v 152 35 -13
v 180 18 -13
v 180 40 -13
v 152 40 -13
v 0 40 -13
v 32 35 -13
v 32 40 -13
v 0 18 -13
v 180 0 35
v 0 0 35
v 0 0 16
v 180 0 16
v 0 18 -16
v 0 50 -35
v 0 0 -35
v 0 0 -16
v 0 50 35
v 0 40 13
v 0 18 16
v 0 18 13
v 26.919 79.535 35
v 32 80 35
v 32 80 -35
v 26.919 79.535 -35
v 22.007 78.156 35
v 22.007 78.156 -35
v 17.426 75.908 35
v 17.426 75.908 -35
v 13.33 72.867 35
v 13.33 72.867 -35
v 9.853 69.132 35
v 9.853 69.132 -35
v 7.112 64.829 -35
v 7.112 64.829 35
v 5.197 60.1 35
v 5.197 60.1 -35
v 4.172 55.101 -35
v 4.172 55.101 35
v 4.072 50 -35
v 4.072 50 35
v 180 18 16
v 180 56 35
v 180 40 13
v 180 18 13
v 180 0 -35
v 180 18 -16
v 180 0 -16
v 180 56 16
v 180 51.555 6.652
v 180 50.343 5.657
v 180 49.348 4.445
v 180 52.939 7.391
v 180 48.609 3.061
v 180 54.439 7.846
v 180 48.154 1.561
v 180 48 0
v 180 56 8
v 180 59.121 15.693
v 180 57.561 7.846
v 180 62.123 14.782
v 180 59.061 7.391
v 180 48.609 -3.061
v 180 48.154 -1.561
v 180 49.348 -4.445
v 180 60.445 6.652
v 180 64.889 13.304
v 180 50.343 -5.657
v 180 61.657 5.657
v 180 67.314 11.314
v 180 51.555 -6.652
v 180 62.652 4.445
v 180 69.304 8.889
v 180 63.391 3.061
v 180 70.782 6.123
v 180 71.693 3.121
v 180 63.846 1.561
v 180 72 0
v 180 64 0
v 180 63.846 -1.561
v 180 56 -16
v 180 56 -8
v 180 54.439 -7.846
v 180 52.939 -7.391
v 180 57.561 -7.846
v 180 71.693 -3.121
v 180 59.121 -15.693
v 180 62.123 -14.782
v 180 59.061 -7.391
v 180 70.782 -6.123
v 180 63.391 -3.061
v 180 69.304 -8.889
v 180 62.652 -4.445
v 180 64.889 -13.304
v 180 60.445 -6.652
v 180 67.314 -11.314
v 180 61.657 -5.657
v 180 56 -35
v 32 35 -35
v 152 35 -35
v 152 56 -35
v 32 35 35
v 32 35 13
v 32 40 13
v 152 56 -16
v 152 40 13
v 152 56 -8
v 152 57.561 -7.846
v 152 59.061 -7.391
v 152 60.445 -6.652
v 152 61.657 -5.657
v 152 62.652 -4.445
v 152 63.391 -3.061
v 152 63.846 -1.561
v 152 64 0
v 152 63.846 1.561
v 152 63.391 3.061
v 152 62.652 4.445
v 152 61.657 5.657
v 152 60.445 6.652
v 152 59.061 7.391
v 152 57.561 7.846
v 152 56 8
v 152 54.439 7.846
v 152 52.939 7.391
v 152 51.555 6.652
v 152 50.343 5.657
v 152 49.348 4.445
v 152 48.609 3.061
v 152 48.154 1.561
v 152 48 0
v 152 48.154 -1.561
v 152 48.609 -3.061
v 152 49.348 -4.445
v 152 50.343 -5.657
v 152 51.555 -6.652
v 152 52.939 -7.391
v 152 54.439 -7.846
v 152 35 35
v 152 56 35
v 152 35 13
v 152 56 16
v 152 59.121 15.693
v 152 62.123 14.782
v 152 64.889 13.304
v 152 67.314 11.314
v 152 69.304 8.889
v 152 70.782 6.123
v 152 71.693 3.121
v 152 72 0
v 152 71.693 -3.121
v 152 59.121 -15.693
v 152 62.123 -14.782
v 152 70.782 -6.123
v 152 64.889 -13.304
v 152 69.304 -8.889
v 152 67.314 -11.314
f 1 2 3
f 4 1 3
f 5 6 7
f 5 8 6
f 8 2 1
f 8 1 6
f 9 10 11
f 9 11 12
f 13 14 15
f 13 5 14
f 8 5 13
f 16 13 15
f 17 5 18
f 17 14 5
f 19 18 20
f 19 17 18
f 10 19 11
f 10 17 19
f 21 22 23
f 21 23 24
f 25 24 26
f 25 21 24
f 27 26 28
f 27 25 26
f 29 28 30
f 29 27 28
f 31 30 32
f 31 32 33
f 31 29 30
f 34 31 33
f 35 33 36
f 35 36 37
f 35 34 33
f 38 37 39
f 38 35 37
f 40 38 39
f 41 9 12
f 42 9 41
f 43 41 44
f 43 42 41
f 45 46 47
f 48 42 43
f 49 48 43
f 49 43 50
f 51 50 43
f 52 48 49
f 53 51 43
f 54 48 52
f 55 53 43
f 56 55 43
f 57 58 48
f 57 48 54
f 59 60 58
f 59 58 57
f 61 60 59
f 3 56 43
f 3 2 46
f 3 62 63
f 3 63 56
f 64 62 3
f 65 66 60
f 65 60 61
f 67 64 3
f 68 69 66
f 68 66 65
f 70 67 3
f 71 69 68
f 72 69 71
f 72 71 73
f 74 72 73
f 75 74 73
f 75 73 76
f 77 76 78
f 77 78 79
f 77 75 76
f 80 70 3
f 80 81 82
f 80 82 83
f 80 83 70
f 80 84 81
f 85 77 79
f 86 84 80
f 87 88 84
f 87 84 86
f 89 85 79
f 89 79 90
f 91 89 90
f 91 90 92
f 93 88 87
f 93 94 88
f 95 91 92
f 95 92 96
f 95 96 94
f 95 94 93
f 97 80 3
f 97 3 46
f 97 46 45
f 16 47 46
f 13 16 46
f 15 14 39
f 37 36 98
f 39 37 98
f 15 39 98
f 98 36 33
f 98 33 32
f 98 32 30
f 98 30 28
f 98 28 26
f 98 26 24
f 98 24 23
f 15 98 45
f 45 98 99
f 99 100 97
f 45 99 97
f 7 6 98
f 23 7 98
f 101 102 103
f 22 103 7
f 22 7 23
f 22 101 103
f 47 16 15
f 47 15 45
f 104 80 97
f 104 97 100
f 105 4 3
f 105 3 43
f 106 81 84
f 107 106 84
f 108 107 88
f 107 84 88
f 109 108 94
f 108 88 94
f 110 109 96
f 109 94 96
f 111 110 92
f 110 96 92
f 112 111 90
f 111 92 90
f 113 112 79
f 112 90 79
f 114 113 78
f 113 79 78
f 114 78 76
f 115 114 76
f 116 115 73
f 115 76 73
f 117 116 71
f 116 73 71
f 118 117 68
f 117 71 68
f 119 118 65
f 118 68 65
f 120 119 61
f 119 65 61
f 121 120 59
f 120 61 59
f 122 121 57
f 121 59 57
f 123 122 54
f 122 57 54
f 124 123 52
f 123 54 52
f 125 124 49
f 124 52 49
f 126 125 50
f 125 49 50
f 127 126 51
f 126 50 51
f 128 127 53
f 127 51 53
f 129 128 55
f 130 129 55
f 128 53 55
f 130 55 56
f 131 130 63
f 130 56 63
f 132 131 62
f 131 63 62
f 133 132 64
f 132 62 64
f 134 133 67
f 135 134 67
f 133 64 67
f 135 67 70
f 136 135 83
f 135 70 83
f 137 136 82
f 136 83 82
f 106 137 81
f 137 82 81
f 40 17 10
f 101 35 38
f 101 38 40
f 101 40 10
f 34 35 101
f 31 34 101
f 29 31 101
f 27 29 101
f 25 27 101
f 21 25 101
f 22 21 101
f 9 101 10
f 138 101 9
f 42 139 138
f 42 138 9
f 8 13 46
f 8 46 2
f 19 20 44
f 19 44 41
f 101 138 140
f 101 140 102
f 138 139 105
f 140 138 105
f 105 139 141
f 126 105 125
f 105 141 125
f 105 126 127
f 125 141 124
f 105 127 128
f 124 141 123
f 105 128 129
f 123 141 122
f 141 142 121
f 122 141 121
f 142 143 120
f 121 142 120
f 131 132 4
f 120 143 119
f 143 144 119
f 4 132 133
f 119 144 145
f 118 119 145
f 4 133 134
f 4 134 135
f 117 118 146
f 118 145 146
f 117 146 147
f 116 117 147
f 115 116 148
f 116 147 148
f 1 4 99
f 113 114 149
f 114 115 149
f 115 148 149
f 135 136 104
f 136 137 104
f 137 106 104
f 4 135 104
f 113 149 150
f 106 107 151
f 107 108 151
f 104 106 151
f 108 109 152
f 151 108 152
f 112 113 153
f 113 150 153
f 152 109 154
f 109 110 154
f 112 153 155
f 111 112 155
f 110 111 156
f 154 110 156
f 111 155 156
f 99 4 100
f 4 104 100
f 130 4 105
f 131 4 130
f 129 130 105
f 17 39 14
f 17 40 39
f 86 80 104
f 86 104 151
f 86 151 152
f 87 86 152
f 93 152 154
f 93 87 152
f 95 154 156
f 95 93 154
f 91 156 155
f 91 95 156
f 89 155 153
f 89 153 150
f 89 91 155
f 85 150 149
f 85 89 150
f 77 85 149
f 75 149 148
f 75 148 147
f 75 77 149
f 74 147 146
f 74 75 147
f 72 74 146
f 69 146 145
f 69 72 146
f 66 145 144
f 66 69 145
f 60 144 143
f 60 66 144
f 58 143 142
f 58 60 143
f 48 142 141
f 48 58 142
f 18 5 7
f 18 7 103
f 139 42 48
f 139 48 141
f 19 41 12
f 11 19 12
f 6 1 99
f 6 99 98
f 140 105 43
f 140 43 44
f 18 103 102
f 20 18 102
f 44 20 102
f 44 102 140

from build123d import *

# Parameters (mm, degrees)
BOSS_EXTRUDE1_DEPTH = 35
CUT_EXTRUDE1_DEPTH  = 201.062490237
SKETCH3_R           = 16
SKETCH3_R_2         = 8
BOSS_EXTRUDE2_DEPTH = 28
CUT_EXTRUDE2_REACH  = 202.062
SKETCH3_2_R         = 8


with BuildPart() as part:
    # Sketch1 → Boss-Extrude1 (new, symmetric)
    with BuildSketch(Plane.XY):
        with BuildLine():
            Line((0, 0), (180, 0))
            Line((180, 0), (180, 56))
            Line((180, 56), (152, 56))
            Line((152, 56), (152, 35))
            Line((152, 35), (32, 35))
            Line((32, 35), (32, 80))
            ThreePointArc((32, 80), (11.506098468, 71.078784028), (4.071519912, 50))
            Line((4.071519912, 50), (0, 50))
            Line((0, 50), (0, 0))
        make_face()
    extrude(amount=BOSS_EXTRUDE1_DEPTH, both=True)

    # Sketch2 → Cut-Extrude1 (cut, through all)
    with BuildSketch(Plane.ZY):
        Polygon((-16, 0), (-16, 18), (-13, 18), (-13, 40), (13, 40), (13, 18), (16, 18), (16, 0), align=None)
    extrude(amount=-CUT_EXTRUDE1_DEPTH, mode=Mode.SUBTRACT)

    # Sketch3 → Boss-Extrude2 (add)
    with BuildSketch(Plane(origin=(180, 0, 0), x_dir=(0, 0, -1), z_dir=(1, 0, 0))):
        with Locations((0, 56)):
            Circle(SKETCH3_R)
        with Locations((0, 56)):
            Circle(SKETCH3_R_2, mode=Mode.SUBTRACT)
    extrude(amount=-BOSS_EXTRUDE2_DEPTH)

    # Sketch3<2> → Cut-Extrude2 (cut, up to next)
    with BuildSketch(Plane(origin=(180, 0, 0), x_dir=(0, 0, -1), z_dir=(1, 0, 0)), mode=Mode.PRIVATE) as cut_extrude2_sk1:
        with Locations((0, 56)):
            Circle(SKETCH3_2_R)
    cut_extrude2_tool1 = extrude(cut_extrude2_sk1.sketch, amount=-CUT_EXTRUDE2_REACH, mode=Mode.PRIVATE) & part.part
    add(cut_extrude2_tool1.solids().sort_by_distance((180, 56, 0))[0], mode=Mode.SUBTRACT)


solid = part.part
